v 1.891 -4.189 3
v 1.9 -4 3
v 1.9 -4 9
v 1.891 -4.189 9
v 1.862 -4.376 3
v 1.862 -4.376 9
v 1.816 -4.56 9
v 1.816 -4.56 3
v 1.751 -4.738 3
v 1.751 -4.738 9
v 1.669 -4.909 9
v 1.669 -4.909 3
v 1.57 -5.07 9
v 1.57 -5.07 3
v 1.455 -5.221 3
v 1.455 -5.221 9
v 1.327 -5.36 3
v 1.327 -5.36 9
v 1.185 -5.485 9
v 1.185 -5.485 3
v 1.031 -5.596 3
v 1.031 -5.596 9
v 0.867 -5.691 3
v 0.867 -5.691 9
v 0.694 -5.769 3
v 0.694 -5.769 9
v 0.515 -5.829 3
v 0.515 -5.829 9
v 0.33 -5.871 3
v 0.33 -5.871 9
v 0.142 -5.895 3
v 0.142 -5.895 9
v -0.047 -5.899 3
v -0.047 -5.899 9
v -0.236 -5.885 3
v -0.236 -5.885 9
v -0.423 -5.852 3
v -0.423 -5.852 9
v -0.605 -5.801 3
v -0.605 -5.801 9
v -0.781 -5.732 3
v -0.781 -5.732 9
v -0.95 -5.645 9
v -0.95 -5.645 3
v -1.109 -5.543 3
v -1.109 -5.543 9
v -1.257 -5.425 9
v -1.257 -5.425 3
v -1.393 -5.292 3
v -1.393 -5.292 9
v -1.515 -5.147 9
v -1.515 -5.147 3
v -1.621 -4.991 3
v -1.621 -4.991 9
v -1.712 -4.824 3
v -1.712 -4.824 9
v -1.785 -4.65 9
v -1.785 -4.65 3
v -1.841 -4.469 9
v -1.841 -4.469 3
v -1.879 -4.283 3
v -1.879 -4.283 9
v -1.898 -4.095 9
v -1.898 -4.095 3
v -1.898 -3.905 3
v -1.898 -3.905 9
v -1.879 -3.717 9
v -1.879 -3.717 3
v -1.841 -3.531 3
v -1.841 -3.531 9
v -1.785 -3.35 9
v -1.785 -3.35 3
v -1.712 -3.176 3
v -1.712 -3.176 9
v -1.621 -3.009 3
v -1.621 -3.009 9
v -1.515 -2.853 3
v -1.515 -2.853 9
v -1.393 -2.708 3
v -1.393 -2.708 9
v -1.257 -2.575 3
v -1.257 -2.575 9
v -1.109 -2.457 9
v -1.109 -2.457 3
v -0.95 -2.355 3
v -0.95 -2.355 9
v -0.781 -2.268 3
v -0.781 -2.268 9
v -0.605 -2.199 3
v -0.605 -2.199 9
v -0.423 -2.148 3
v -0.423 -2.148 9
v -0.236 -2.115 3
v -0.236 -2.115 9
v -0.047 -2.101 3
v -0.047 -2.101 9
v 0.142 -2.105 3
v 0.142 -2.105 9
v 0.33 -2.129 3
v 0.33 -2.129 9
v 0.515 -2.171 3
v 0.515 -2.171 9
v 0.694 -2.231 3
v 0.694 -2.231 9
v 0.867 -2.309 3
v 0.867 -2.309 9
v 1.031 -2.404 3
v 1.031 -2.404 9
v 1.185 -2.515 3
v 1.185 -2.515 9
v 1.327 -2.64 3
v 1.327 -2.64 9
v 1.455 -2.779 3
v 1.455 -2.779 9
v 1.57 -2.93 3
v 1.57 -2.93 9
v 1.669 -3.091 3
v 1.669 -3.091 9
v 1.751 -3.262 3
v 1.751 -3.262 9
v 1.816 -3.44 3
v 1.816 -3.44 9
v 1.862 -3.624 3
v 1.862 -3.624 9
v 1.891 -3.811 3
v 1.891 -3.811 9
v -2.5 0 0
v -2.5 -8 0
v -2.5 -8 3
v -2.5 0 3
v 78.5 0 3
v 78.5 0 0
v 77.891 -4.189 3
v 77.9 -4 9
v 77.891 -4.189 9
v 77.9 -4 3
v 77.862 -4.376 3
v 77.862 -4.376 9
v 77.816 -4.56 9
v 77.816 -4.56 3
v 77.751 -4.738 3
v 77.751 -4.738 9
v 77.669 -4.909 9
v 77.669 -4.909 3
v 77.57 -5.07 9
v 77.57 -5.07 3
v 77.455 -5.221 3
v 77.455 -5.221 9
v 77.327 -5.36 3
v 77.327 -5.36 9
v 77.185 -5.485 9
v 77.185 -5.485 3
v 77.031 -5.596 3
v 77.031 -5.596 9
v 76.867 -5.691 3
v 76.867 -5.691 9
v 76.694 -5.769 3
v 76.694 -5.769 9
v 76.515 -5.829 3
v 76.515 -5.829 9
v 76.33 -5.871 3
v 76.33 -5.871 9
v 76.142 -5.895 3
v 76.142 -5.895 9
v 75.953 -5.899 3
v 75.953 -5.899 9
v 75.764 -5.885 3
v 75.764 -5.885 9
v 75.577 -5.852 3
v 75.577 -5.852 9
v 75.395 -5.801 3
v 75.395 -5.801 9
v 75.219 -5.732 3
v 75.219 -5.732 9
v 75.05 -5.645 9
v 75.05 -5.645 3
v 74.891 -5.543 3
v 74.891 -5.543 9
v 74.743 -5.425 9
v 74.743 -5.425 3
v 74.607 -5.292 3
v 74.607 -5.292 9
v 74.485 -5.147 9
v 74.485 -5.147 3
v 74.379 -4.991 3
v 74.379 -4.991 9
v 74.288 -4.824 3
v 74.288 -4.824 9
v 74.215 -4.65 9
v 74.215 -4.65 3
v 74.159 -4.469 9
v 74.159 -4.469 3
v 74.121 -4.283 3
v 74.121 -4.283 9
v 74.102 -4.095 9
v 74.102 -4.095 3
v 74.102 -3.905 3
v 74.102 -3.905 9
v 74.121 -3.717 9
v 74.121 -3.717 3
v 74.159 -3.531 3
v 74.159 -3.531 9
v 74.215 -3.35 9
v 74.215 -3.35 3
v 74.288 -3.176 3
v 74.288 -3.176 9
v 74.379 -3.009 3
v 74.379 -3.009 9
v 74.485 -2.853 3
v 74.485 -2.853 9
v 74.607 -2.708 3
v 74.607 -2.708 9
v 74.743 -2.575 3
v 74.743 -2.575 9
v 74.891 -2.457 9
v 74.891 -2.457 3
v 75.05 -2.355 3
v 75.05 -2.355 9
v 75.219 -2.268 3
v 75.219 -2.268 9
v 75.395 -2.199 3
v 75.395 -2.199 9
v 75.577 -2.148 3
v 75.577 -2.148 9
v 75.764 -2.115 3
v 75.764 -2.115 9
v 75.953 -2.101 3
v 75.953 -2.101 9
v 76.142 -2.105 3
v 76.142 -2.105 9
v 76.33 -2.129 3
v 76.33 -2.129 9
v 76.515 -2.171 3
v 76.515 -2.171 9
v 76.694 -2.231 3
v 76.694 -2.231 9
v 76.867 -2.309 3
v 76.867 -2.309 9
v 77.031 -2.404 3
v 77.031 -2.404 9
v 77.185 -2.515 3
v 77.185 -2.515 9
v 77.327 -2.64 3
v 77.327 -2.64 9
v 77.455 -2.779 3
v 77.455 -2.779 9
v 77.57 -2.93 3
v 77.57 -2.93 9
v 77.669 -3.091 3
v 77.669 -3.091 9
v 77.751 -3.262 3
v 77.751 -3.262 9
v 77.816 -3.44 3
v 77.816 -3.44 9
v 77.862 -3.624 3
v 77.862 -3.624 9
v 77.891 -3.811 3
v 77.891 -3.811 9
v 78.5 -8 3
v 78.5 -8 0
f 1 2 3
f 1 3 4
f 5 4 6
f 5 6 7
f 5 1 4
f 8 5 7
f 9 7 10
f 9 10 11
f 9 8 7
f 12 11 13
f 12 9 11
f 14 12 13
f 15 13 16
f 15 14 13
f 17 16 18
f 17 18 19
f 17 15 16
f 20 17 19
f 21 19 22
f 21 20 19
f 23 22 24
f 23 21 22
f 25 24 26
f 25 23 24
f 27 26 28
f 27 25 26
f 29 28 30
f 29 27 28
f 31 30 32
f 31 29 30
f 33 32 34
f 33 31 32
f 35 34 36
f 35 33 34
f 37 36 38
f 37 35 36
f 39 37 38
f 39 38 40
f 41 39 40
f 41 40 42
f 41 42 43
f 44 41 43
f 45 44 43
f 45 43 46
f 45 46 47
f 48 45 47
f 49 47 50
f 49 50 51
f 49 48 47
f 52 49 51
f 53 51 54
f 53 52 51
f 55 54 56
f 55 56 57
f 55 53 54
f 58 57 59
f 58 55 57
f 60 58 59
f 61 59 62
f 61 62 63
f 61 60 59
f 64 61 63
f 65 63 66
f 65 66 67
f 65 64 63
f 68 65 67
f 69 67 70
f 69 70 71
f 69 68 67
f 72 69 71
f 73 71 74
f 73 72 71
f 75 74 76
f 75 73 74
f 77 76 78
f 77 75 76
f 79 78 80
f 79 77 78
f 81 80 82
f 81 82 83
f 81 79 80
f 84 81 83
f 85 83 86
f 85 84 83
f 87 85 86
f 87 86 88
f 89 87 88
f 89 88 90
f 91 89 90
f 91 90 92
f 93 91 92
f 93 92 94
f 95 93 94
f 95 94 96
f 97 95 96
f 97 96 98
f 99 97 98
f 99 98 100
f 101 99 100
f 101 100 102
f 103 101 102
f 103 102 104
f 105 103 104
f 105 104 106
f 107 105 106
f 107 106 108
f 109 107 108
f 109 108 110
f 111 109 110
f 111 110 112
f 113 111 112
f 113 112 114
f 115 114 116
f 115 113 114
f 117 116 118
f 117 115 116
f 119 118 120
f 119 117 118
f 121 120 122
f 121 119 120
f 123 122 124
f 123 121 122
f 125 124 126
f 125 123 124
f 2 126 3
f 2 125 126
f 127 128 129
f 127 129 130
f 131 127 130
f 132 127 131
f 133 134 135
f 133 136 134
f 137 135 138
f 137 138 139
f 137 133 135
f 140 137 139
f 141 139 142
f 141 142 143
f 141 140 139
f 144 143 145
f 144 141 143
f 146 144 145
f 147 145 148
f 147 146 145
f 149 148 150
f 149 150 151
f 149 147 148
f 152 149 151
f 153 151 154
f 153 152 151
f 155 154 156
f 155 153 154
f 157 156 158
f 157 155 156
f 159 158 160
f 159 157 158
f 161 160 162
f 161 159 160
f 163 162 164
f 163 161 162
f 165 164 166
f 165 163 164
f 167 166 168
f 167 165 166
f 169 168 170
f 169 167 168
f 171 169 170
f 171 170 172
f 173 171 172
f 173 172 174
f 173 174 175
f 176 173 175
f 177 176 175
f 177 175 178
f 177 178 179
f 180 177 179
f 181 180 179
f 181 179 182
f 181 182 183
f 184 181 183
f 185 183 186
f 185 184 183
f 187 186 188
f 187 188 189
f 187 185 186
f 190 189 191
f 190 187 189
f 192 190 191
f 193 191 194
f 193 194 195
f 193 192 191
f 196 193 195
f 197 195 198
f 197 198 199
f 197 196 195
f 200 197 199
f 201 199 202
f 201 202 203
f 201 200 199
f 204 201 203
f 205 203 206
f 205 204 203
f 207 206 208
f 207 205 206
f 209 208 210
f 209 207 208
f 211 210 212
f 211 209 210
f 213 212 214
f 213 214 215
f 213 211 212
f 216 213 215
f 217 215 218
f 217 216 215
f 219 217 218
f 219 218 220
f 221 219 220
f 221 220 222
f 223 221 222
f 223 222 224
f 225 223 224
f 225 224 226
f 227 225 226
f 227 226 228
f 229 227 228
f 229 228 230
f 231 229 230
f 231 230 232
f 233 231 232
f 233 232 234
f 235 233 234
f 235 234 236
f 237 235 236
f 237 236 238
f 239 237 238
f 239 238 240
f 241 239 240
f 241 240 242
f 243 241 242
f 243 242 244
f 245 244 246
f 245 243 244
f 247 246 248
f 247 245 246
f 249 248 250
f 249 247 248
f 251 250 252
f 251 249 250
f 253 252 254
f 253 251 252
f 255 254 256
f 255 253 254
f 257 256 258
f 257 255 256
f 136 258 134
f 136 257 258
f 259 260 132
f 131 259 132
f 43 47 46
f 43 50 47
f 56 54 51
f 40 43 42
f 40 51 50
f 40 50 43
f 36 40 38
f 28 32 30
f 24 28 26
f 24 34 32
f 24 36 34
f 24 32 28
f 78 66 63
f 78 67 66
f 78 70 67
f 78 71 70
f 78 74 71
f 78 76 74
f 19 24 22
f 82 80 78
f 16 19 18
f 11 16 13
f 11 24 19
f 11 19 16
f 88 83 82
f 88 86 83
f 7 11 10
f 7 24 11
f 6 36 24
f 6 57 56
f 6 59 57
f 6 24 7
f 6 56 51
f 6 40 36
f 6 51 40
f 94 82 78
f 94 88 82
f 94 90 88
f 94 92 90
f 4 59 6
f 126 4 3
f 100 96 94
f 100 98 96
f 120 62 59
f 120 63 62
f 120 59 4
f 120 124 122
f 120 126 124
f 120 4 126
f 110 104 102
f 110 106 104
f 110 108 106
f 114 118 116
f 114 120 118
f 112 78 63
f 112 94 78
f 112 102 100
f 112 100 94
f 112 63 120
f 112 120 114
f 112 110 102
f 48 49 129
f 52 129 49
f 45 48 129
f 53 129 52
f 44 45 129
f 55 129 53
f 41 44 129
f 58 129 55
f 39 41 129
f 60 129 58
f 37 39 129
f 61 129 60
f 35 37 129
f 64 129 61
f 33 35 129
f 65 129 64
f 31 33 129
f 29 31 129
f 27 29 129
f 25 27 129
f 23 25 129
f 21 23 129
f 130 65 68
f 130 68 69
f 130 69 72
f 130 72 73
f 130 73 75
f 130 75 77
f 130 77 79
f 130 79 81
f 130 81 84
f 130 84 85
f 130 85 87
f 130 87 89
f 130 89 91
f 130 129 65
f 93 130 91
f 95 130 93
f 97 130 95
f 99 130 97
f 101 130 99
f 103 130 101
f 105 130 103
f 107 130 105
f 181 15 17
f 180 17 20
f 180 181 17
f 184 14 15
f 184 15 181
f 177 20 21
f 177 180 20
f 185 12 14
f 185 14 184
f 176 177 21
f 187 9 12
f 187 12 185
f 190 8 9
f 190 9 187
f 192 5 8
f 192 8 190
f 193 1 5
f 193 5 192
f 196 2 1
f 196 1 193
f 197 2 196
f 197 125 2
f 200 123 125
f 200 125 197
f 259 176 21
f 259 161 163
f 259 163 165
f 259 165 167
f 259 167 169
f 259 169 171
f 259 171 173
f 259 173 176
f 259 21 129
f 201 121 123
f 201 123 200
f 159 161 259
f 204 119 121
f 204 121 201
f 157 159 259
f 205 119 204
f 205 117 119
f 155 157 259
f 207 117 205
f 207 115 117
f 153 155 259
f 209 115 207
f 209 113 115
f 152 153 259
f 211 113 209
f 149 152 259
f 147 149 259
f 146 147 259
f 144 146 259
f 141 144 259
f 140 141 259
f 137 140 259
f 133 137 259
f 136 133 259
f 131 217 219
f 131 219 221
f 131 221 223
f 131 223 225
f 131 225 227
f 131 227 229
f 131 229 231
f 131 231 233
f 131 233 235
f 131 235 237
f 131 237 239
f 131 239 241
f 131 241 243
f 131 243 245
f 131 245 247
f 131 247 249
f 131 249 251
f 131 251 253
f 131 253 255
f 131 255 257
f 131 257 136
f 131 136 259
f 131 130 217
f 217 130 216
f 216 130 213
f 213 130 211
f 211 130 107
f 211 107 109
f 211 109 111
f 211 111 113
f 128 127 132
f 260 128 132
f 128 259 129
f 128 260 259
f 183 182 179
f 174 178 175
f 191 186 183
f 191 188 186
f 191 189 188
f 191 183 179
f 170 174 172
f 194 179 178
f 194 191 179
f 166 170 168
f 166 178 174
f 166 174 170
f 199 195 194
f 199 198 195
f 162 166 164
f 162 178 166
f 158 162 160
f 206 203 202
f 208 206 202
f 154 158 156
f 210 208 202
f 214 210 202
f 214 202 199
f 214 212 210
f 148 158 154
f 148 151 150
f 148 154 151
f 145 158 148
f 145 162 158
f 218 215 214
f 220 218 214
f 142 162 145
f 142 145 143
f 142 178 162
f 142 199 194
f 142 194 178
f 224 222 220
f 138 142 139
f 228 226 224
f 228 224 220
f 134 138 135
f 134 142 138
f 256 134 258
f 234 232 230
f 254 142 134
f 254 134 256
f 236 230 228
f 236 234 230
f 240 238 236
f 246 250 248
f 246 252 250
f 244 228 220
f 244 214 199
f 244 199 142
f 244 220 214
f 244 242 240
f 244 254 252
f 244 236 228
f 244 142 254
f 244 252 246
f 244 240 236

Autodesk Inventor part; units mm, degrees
ref_plane "YZ Plane" through (0, 0, 0) normal (1, 0, 0) x (0, 1, 0)
ref_plane "XZ Plane" through (0, 0, 0) normal (0, 1, 0) x (-1, 0, 0)
ref_plane "XY Plane" through (0, 0, 0) normal (0, 0, 1) x (1, 0, 0)
sketch "Sketch1" plane through (0, 0, 0) normal (0, 0, 1) x (1, 0, 0)
  line L0 (0, 0) -> (76, 0)
  line L1 (76, 0) -> (76, -8)
  line L2 (76, -8) -> (0, -8)
  line L3 (0, -8) -> (0, 0)
  dimension "d0" = 76
  dimension "d1" = 8
extrude "Extrusion1" add sketch "Sketch1" along normal blind 3
sketch "Sketch2" plane through (0, 0, 3) normal (0, 0, 1) x (1, 0, 0)
  line L0 (0, 0) -> (0, -8) projected
  circle A0 centre (0, -4) radius 1.9
  line L1 (76, -8) -> (76, 0) projected
  circle A1 centre (76, -4) radius 1.9
  dimension "d4" = 3.8
  dimension "d5" = 3.8
extrude "Extrusion2" add sketch "Sketch2" along normal blind 6
sketch "Sketch3" plane through (0, 0, 0) normal (0, 0, -1) x (-1, 0, 0)
  line L0 (0, -8) -> (-76, -8) projected
  line L1 (0, -8) -> (2.5, -8)
  line L2 (2.5, -8) -> (2.5, 0)
  line L3 (2.5, 0) -> (0, 0)
  line L4 (0, 0) -> (0, -8)
  line L5 (-76, -8) -> (-78.5, -8)
  line L6 (-78.5, -8) -> (-78.5, 0)
  line L7 (-78.5, 0) -> (-76, 0)
  line L8 (-76, 0) -> (-76, -8)
  dimension "d8" = 2.5
  dimension "d9" = 2.5
extrude "Extrusion3" add sketch "Sketch3" against normal blind 3
properties part number "SteeringWheel"
